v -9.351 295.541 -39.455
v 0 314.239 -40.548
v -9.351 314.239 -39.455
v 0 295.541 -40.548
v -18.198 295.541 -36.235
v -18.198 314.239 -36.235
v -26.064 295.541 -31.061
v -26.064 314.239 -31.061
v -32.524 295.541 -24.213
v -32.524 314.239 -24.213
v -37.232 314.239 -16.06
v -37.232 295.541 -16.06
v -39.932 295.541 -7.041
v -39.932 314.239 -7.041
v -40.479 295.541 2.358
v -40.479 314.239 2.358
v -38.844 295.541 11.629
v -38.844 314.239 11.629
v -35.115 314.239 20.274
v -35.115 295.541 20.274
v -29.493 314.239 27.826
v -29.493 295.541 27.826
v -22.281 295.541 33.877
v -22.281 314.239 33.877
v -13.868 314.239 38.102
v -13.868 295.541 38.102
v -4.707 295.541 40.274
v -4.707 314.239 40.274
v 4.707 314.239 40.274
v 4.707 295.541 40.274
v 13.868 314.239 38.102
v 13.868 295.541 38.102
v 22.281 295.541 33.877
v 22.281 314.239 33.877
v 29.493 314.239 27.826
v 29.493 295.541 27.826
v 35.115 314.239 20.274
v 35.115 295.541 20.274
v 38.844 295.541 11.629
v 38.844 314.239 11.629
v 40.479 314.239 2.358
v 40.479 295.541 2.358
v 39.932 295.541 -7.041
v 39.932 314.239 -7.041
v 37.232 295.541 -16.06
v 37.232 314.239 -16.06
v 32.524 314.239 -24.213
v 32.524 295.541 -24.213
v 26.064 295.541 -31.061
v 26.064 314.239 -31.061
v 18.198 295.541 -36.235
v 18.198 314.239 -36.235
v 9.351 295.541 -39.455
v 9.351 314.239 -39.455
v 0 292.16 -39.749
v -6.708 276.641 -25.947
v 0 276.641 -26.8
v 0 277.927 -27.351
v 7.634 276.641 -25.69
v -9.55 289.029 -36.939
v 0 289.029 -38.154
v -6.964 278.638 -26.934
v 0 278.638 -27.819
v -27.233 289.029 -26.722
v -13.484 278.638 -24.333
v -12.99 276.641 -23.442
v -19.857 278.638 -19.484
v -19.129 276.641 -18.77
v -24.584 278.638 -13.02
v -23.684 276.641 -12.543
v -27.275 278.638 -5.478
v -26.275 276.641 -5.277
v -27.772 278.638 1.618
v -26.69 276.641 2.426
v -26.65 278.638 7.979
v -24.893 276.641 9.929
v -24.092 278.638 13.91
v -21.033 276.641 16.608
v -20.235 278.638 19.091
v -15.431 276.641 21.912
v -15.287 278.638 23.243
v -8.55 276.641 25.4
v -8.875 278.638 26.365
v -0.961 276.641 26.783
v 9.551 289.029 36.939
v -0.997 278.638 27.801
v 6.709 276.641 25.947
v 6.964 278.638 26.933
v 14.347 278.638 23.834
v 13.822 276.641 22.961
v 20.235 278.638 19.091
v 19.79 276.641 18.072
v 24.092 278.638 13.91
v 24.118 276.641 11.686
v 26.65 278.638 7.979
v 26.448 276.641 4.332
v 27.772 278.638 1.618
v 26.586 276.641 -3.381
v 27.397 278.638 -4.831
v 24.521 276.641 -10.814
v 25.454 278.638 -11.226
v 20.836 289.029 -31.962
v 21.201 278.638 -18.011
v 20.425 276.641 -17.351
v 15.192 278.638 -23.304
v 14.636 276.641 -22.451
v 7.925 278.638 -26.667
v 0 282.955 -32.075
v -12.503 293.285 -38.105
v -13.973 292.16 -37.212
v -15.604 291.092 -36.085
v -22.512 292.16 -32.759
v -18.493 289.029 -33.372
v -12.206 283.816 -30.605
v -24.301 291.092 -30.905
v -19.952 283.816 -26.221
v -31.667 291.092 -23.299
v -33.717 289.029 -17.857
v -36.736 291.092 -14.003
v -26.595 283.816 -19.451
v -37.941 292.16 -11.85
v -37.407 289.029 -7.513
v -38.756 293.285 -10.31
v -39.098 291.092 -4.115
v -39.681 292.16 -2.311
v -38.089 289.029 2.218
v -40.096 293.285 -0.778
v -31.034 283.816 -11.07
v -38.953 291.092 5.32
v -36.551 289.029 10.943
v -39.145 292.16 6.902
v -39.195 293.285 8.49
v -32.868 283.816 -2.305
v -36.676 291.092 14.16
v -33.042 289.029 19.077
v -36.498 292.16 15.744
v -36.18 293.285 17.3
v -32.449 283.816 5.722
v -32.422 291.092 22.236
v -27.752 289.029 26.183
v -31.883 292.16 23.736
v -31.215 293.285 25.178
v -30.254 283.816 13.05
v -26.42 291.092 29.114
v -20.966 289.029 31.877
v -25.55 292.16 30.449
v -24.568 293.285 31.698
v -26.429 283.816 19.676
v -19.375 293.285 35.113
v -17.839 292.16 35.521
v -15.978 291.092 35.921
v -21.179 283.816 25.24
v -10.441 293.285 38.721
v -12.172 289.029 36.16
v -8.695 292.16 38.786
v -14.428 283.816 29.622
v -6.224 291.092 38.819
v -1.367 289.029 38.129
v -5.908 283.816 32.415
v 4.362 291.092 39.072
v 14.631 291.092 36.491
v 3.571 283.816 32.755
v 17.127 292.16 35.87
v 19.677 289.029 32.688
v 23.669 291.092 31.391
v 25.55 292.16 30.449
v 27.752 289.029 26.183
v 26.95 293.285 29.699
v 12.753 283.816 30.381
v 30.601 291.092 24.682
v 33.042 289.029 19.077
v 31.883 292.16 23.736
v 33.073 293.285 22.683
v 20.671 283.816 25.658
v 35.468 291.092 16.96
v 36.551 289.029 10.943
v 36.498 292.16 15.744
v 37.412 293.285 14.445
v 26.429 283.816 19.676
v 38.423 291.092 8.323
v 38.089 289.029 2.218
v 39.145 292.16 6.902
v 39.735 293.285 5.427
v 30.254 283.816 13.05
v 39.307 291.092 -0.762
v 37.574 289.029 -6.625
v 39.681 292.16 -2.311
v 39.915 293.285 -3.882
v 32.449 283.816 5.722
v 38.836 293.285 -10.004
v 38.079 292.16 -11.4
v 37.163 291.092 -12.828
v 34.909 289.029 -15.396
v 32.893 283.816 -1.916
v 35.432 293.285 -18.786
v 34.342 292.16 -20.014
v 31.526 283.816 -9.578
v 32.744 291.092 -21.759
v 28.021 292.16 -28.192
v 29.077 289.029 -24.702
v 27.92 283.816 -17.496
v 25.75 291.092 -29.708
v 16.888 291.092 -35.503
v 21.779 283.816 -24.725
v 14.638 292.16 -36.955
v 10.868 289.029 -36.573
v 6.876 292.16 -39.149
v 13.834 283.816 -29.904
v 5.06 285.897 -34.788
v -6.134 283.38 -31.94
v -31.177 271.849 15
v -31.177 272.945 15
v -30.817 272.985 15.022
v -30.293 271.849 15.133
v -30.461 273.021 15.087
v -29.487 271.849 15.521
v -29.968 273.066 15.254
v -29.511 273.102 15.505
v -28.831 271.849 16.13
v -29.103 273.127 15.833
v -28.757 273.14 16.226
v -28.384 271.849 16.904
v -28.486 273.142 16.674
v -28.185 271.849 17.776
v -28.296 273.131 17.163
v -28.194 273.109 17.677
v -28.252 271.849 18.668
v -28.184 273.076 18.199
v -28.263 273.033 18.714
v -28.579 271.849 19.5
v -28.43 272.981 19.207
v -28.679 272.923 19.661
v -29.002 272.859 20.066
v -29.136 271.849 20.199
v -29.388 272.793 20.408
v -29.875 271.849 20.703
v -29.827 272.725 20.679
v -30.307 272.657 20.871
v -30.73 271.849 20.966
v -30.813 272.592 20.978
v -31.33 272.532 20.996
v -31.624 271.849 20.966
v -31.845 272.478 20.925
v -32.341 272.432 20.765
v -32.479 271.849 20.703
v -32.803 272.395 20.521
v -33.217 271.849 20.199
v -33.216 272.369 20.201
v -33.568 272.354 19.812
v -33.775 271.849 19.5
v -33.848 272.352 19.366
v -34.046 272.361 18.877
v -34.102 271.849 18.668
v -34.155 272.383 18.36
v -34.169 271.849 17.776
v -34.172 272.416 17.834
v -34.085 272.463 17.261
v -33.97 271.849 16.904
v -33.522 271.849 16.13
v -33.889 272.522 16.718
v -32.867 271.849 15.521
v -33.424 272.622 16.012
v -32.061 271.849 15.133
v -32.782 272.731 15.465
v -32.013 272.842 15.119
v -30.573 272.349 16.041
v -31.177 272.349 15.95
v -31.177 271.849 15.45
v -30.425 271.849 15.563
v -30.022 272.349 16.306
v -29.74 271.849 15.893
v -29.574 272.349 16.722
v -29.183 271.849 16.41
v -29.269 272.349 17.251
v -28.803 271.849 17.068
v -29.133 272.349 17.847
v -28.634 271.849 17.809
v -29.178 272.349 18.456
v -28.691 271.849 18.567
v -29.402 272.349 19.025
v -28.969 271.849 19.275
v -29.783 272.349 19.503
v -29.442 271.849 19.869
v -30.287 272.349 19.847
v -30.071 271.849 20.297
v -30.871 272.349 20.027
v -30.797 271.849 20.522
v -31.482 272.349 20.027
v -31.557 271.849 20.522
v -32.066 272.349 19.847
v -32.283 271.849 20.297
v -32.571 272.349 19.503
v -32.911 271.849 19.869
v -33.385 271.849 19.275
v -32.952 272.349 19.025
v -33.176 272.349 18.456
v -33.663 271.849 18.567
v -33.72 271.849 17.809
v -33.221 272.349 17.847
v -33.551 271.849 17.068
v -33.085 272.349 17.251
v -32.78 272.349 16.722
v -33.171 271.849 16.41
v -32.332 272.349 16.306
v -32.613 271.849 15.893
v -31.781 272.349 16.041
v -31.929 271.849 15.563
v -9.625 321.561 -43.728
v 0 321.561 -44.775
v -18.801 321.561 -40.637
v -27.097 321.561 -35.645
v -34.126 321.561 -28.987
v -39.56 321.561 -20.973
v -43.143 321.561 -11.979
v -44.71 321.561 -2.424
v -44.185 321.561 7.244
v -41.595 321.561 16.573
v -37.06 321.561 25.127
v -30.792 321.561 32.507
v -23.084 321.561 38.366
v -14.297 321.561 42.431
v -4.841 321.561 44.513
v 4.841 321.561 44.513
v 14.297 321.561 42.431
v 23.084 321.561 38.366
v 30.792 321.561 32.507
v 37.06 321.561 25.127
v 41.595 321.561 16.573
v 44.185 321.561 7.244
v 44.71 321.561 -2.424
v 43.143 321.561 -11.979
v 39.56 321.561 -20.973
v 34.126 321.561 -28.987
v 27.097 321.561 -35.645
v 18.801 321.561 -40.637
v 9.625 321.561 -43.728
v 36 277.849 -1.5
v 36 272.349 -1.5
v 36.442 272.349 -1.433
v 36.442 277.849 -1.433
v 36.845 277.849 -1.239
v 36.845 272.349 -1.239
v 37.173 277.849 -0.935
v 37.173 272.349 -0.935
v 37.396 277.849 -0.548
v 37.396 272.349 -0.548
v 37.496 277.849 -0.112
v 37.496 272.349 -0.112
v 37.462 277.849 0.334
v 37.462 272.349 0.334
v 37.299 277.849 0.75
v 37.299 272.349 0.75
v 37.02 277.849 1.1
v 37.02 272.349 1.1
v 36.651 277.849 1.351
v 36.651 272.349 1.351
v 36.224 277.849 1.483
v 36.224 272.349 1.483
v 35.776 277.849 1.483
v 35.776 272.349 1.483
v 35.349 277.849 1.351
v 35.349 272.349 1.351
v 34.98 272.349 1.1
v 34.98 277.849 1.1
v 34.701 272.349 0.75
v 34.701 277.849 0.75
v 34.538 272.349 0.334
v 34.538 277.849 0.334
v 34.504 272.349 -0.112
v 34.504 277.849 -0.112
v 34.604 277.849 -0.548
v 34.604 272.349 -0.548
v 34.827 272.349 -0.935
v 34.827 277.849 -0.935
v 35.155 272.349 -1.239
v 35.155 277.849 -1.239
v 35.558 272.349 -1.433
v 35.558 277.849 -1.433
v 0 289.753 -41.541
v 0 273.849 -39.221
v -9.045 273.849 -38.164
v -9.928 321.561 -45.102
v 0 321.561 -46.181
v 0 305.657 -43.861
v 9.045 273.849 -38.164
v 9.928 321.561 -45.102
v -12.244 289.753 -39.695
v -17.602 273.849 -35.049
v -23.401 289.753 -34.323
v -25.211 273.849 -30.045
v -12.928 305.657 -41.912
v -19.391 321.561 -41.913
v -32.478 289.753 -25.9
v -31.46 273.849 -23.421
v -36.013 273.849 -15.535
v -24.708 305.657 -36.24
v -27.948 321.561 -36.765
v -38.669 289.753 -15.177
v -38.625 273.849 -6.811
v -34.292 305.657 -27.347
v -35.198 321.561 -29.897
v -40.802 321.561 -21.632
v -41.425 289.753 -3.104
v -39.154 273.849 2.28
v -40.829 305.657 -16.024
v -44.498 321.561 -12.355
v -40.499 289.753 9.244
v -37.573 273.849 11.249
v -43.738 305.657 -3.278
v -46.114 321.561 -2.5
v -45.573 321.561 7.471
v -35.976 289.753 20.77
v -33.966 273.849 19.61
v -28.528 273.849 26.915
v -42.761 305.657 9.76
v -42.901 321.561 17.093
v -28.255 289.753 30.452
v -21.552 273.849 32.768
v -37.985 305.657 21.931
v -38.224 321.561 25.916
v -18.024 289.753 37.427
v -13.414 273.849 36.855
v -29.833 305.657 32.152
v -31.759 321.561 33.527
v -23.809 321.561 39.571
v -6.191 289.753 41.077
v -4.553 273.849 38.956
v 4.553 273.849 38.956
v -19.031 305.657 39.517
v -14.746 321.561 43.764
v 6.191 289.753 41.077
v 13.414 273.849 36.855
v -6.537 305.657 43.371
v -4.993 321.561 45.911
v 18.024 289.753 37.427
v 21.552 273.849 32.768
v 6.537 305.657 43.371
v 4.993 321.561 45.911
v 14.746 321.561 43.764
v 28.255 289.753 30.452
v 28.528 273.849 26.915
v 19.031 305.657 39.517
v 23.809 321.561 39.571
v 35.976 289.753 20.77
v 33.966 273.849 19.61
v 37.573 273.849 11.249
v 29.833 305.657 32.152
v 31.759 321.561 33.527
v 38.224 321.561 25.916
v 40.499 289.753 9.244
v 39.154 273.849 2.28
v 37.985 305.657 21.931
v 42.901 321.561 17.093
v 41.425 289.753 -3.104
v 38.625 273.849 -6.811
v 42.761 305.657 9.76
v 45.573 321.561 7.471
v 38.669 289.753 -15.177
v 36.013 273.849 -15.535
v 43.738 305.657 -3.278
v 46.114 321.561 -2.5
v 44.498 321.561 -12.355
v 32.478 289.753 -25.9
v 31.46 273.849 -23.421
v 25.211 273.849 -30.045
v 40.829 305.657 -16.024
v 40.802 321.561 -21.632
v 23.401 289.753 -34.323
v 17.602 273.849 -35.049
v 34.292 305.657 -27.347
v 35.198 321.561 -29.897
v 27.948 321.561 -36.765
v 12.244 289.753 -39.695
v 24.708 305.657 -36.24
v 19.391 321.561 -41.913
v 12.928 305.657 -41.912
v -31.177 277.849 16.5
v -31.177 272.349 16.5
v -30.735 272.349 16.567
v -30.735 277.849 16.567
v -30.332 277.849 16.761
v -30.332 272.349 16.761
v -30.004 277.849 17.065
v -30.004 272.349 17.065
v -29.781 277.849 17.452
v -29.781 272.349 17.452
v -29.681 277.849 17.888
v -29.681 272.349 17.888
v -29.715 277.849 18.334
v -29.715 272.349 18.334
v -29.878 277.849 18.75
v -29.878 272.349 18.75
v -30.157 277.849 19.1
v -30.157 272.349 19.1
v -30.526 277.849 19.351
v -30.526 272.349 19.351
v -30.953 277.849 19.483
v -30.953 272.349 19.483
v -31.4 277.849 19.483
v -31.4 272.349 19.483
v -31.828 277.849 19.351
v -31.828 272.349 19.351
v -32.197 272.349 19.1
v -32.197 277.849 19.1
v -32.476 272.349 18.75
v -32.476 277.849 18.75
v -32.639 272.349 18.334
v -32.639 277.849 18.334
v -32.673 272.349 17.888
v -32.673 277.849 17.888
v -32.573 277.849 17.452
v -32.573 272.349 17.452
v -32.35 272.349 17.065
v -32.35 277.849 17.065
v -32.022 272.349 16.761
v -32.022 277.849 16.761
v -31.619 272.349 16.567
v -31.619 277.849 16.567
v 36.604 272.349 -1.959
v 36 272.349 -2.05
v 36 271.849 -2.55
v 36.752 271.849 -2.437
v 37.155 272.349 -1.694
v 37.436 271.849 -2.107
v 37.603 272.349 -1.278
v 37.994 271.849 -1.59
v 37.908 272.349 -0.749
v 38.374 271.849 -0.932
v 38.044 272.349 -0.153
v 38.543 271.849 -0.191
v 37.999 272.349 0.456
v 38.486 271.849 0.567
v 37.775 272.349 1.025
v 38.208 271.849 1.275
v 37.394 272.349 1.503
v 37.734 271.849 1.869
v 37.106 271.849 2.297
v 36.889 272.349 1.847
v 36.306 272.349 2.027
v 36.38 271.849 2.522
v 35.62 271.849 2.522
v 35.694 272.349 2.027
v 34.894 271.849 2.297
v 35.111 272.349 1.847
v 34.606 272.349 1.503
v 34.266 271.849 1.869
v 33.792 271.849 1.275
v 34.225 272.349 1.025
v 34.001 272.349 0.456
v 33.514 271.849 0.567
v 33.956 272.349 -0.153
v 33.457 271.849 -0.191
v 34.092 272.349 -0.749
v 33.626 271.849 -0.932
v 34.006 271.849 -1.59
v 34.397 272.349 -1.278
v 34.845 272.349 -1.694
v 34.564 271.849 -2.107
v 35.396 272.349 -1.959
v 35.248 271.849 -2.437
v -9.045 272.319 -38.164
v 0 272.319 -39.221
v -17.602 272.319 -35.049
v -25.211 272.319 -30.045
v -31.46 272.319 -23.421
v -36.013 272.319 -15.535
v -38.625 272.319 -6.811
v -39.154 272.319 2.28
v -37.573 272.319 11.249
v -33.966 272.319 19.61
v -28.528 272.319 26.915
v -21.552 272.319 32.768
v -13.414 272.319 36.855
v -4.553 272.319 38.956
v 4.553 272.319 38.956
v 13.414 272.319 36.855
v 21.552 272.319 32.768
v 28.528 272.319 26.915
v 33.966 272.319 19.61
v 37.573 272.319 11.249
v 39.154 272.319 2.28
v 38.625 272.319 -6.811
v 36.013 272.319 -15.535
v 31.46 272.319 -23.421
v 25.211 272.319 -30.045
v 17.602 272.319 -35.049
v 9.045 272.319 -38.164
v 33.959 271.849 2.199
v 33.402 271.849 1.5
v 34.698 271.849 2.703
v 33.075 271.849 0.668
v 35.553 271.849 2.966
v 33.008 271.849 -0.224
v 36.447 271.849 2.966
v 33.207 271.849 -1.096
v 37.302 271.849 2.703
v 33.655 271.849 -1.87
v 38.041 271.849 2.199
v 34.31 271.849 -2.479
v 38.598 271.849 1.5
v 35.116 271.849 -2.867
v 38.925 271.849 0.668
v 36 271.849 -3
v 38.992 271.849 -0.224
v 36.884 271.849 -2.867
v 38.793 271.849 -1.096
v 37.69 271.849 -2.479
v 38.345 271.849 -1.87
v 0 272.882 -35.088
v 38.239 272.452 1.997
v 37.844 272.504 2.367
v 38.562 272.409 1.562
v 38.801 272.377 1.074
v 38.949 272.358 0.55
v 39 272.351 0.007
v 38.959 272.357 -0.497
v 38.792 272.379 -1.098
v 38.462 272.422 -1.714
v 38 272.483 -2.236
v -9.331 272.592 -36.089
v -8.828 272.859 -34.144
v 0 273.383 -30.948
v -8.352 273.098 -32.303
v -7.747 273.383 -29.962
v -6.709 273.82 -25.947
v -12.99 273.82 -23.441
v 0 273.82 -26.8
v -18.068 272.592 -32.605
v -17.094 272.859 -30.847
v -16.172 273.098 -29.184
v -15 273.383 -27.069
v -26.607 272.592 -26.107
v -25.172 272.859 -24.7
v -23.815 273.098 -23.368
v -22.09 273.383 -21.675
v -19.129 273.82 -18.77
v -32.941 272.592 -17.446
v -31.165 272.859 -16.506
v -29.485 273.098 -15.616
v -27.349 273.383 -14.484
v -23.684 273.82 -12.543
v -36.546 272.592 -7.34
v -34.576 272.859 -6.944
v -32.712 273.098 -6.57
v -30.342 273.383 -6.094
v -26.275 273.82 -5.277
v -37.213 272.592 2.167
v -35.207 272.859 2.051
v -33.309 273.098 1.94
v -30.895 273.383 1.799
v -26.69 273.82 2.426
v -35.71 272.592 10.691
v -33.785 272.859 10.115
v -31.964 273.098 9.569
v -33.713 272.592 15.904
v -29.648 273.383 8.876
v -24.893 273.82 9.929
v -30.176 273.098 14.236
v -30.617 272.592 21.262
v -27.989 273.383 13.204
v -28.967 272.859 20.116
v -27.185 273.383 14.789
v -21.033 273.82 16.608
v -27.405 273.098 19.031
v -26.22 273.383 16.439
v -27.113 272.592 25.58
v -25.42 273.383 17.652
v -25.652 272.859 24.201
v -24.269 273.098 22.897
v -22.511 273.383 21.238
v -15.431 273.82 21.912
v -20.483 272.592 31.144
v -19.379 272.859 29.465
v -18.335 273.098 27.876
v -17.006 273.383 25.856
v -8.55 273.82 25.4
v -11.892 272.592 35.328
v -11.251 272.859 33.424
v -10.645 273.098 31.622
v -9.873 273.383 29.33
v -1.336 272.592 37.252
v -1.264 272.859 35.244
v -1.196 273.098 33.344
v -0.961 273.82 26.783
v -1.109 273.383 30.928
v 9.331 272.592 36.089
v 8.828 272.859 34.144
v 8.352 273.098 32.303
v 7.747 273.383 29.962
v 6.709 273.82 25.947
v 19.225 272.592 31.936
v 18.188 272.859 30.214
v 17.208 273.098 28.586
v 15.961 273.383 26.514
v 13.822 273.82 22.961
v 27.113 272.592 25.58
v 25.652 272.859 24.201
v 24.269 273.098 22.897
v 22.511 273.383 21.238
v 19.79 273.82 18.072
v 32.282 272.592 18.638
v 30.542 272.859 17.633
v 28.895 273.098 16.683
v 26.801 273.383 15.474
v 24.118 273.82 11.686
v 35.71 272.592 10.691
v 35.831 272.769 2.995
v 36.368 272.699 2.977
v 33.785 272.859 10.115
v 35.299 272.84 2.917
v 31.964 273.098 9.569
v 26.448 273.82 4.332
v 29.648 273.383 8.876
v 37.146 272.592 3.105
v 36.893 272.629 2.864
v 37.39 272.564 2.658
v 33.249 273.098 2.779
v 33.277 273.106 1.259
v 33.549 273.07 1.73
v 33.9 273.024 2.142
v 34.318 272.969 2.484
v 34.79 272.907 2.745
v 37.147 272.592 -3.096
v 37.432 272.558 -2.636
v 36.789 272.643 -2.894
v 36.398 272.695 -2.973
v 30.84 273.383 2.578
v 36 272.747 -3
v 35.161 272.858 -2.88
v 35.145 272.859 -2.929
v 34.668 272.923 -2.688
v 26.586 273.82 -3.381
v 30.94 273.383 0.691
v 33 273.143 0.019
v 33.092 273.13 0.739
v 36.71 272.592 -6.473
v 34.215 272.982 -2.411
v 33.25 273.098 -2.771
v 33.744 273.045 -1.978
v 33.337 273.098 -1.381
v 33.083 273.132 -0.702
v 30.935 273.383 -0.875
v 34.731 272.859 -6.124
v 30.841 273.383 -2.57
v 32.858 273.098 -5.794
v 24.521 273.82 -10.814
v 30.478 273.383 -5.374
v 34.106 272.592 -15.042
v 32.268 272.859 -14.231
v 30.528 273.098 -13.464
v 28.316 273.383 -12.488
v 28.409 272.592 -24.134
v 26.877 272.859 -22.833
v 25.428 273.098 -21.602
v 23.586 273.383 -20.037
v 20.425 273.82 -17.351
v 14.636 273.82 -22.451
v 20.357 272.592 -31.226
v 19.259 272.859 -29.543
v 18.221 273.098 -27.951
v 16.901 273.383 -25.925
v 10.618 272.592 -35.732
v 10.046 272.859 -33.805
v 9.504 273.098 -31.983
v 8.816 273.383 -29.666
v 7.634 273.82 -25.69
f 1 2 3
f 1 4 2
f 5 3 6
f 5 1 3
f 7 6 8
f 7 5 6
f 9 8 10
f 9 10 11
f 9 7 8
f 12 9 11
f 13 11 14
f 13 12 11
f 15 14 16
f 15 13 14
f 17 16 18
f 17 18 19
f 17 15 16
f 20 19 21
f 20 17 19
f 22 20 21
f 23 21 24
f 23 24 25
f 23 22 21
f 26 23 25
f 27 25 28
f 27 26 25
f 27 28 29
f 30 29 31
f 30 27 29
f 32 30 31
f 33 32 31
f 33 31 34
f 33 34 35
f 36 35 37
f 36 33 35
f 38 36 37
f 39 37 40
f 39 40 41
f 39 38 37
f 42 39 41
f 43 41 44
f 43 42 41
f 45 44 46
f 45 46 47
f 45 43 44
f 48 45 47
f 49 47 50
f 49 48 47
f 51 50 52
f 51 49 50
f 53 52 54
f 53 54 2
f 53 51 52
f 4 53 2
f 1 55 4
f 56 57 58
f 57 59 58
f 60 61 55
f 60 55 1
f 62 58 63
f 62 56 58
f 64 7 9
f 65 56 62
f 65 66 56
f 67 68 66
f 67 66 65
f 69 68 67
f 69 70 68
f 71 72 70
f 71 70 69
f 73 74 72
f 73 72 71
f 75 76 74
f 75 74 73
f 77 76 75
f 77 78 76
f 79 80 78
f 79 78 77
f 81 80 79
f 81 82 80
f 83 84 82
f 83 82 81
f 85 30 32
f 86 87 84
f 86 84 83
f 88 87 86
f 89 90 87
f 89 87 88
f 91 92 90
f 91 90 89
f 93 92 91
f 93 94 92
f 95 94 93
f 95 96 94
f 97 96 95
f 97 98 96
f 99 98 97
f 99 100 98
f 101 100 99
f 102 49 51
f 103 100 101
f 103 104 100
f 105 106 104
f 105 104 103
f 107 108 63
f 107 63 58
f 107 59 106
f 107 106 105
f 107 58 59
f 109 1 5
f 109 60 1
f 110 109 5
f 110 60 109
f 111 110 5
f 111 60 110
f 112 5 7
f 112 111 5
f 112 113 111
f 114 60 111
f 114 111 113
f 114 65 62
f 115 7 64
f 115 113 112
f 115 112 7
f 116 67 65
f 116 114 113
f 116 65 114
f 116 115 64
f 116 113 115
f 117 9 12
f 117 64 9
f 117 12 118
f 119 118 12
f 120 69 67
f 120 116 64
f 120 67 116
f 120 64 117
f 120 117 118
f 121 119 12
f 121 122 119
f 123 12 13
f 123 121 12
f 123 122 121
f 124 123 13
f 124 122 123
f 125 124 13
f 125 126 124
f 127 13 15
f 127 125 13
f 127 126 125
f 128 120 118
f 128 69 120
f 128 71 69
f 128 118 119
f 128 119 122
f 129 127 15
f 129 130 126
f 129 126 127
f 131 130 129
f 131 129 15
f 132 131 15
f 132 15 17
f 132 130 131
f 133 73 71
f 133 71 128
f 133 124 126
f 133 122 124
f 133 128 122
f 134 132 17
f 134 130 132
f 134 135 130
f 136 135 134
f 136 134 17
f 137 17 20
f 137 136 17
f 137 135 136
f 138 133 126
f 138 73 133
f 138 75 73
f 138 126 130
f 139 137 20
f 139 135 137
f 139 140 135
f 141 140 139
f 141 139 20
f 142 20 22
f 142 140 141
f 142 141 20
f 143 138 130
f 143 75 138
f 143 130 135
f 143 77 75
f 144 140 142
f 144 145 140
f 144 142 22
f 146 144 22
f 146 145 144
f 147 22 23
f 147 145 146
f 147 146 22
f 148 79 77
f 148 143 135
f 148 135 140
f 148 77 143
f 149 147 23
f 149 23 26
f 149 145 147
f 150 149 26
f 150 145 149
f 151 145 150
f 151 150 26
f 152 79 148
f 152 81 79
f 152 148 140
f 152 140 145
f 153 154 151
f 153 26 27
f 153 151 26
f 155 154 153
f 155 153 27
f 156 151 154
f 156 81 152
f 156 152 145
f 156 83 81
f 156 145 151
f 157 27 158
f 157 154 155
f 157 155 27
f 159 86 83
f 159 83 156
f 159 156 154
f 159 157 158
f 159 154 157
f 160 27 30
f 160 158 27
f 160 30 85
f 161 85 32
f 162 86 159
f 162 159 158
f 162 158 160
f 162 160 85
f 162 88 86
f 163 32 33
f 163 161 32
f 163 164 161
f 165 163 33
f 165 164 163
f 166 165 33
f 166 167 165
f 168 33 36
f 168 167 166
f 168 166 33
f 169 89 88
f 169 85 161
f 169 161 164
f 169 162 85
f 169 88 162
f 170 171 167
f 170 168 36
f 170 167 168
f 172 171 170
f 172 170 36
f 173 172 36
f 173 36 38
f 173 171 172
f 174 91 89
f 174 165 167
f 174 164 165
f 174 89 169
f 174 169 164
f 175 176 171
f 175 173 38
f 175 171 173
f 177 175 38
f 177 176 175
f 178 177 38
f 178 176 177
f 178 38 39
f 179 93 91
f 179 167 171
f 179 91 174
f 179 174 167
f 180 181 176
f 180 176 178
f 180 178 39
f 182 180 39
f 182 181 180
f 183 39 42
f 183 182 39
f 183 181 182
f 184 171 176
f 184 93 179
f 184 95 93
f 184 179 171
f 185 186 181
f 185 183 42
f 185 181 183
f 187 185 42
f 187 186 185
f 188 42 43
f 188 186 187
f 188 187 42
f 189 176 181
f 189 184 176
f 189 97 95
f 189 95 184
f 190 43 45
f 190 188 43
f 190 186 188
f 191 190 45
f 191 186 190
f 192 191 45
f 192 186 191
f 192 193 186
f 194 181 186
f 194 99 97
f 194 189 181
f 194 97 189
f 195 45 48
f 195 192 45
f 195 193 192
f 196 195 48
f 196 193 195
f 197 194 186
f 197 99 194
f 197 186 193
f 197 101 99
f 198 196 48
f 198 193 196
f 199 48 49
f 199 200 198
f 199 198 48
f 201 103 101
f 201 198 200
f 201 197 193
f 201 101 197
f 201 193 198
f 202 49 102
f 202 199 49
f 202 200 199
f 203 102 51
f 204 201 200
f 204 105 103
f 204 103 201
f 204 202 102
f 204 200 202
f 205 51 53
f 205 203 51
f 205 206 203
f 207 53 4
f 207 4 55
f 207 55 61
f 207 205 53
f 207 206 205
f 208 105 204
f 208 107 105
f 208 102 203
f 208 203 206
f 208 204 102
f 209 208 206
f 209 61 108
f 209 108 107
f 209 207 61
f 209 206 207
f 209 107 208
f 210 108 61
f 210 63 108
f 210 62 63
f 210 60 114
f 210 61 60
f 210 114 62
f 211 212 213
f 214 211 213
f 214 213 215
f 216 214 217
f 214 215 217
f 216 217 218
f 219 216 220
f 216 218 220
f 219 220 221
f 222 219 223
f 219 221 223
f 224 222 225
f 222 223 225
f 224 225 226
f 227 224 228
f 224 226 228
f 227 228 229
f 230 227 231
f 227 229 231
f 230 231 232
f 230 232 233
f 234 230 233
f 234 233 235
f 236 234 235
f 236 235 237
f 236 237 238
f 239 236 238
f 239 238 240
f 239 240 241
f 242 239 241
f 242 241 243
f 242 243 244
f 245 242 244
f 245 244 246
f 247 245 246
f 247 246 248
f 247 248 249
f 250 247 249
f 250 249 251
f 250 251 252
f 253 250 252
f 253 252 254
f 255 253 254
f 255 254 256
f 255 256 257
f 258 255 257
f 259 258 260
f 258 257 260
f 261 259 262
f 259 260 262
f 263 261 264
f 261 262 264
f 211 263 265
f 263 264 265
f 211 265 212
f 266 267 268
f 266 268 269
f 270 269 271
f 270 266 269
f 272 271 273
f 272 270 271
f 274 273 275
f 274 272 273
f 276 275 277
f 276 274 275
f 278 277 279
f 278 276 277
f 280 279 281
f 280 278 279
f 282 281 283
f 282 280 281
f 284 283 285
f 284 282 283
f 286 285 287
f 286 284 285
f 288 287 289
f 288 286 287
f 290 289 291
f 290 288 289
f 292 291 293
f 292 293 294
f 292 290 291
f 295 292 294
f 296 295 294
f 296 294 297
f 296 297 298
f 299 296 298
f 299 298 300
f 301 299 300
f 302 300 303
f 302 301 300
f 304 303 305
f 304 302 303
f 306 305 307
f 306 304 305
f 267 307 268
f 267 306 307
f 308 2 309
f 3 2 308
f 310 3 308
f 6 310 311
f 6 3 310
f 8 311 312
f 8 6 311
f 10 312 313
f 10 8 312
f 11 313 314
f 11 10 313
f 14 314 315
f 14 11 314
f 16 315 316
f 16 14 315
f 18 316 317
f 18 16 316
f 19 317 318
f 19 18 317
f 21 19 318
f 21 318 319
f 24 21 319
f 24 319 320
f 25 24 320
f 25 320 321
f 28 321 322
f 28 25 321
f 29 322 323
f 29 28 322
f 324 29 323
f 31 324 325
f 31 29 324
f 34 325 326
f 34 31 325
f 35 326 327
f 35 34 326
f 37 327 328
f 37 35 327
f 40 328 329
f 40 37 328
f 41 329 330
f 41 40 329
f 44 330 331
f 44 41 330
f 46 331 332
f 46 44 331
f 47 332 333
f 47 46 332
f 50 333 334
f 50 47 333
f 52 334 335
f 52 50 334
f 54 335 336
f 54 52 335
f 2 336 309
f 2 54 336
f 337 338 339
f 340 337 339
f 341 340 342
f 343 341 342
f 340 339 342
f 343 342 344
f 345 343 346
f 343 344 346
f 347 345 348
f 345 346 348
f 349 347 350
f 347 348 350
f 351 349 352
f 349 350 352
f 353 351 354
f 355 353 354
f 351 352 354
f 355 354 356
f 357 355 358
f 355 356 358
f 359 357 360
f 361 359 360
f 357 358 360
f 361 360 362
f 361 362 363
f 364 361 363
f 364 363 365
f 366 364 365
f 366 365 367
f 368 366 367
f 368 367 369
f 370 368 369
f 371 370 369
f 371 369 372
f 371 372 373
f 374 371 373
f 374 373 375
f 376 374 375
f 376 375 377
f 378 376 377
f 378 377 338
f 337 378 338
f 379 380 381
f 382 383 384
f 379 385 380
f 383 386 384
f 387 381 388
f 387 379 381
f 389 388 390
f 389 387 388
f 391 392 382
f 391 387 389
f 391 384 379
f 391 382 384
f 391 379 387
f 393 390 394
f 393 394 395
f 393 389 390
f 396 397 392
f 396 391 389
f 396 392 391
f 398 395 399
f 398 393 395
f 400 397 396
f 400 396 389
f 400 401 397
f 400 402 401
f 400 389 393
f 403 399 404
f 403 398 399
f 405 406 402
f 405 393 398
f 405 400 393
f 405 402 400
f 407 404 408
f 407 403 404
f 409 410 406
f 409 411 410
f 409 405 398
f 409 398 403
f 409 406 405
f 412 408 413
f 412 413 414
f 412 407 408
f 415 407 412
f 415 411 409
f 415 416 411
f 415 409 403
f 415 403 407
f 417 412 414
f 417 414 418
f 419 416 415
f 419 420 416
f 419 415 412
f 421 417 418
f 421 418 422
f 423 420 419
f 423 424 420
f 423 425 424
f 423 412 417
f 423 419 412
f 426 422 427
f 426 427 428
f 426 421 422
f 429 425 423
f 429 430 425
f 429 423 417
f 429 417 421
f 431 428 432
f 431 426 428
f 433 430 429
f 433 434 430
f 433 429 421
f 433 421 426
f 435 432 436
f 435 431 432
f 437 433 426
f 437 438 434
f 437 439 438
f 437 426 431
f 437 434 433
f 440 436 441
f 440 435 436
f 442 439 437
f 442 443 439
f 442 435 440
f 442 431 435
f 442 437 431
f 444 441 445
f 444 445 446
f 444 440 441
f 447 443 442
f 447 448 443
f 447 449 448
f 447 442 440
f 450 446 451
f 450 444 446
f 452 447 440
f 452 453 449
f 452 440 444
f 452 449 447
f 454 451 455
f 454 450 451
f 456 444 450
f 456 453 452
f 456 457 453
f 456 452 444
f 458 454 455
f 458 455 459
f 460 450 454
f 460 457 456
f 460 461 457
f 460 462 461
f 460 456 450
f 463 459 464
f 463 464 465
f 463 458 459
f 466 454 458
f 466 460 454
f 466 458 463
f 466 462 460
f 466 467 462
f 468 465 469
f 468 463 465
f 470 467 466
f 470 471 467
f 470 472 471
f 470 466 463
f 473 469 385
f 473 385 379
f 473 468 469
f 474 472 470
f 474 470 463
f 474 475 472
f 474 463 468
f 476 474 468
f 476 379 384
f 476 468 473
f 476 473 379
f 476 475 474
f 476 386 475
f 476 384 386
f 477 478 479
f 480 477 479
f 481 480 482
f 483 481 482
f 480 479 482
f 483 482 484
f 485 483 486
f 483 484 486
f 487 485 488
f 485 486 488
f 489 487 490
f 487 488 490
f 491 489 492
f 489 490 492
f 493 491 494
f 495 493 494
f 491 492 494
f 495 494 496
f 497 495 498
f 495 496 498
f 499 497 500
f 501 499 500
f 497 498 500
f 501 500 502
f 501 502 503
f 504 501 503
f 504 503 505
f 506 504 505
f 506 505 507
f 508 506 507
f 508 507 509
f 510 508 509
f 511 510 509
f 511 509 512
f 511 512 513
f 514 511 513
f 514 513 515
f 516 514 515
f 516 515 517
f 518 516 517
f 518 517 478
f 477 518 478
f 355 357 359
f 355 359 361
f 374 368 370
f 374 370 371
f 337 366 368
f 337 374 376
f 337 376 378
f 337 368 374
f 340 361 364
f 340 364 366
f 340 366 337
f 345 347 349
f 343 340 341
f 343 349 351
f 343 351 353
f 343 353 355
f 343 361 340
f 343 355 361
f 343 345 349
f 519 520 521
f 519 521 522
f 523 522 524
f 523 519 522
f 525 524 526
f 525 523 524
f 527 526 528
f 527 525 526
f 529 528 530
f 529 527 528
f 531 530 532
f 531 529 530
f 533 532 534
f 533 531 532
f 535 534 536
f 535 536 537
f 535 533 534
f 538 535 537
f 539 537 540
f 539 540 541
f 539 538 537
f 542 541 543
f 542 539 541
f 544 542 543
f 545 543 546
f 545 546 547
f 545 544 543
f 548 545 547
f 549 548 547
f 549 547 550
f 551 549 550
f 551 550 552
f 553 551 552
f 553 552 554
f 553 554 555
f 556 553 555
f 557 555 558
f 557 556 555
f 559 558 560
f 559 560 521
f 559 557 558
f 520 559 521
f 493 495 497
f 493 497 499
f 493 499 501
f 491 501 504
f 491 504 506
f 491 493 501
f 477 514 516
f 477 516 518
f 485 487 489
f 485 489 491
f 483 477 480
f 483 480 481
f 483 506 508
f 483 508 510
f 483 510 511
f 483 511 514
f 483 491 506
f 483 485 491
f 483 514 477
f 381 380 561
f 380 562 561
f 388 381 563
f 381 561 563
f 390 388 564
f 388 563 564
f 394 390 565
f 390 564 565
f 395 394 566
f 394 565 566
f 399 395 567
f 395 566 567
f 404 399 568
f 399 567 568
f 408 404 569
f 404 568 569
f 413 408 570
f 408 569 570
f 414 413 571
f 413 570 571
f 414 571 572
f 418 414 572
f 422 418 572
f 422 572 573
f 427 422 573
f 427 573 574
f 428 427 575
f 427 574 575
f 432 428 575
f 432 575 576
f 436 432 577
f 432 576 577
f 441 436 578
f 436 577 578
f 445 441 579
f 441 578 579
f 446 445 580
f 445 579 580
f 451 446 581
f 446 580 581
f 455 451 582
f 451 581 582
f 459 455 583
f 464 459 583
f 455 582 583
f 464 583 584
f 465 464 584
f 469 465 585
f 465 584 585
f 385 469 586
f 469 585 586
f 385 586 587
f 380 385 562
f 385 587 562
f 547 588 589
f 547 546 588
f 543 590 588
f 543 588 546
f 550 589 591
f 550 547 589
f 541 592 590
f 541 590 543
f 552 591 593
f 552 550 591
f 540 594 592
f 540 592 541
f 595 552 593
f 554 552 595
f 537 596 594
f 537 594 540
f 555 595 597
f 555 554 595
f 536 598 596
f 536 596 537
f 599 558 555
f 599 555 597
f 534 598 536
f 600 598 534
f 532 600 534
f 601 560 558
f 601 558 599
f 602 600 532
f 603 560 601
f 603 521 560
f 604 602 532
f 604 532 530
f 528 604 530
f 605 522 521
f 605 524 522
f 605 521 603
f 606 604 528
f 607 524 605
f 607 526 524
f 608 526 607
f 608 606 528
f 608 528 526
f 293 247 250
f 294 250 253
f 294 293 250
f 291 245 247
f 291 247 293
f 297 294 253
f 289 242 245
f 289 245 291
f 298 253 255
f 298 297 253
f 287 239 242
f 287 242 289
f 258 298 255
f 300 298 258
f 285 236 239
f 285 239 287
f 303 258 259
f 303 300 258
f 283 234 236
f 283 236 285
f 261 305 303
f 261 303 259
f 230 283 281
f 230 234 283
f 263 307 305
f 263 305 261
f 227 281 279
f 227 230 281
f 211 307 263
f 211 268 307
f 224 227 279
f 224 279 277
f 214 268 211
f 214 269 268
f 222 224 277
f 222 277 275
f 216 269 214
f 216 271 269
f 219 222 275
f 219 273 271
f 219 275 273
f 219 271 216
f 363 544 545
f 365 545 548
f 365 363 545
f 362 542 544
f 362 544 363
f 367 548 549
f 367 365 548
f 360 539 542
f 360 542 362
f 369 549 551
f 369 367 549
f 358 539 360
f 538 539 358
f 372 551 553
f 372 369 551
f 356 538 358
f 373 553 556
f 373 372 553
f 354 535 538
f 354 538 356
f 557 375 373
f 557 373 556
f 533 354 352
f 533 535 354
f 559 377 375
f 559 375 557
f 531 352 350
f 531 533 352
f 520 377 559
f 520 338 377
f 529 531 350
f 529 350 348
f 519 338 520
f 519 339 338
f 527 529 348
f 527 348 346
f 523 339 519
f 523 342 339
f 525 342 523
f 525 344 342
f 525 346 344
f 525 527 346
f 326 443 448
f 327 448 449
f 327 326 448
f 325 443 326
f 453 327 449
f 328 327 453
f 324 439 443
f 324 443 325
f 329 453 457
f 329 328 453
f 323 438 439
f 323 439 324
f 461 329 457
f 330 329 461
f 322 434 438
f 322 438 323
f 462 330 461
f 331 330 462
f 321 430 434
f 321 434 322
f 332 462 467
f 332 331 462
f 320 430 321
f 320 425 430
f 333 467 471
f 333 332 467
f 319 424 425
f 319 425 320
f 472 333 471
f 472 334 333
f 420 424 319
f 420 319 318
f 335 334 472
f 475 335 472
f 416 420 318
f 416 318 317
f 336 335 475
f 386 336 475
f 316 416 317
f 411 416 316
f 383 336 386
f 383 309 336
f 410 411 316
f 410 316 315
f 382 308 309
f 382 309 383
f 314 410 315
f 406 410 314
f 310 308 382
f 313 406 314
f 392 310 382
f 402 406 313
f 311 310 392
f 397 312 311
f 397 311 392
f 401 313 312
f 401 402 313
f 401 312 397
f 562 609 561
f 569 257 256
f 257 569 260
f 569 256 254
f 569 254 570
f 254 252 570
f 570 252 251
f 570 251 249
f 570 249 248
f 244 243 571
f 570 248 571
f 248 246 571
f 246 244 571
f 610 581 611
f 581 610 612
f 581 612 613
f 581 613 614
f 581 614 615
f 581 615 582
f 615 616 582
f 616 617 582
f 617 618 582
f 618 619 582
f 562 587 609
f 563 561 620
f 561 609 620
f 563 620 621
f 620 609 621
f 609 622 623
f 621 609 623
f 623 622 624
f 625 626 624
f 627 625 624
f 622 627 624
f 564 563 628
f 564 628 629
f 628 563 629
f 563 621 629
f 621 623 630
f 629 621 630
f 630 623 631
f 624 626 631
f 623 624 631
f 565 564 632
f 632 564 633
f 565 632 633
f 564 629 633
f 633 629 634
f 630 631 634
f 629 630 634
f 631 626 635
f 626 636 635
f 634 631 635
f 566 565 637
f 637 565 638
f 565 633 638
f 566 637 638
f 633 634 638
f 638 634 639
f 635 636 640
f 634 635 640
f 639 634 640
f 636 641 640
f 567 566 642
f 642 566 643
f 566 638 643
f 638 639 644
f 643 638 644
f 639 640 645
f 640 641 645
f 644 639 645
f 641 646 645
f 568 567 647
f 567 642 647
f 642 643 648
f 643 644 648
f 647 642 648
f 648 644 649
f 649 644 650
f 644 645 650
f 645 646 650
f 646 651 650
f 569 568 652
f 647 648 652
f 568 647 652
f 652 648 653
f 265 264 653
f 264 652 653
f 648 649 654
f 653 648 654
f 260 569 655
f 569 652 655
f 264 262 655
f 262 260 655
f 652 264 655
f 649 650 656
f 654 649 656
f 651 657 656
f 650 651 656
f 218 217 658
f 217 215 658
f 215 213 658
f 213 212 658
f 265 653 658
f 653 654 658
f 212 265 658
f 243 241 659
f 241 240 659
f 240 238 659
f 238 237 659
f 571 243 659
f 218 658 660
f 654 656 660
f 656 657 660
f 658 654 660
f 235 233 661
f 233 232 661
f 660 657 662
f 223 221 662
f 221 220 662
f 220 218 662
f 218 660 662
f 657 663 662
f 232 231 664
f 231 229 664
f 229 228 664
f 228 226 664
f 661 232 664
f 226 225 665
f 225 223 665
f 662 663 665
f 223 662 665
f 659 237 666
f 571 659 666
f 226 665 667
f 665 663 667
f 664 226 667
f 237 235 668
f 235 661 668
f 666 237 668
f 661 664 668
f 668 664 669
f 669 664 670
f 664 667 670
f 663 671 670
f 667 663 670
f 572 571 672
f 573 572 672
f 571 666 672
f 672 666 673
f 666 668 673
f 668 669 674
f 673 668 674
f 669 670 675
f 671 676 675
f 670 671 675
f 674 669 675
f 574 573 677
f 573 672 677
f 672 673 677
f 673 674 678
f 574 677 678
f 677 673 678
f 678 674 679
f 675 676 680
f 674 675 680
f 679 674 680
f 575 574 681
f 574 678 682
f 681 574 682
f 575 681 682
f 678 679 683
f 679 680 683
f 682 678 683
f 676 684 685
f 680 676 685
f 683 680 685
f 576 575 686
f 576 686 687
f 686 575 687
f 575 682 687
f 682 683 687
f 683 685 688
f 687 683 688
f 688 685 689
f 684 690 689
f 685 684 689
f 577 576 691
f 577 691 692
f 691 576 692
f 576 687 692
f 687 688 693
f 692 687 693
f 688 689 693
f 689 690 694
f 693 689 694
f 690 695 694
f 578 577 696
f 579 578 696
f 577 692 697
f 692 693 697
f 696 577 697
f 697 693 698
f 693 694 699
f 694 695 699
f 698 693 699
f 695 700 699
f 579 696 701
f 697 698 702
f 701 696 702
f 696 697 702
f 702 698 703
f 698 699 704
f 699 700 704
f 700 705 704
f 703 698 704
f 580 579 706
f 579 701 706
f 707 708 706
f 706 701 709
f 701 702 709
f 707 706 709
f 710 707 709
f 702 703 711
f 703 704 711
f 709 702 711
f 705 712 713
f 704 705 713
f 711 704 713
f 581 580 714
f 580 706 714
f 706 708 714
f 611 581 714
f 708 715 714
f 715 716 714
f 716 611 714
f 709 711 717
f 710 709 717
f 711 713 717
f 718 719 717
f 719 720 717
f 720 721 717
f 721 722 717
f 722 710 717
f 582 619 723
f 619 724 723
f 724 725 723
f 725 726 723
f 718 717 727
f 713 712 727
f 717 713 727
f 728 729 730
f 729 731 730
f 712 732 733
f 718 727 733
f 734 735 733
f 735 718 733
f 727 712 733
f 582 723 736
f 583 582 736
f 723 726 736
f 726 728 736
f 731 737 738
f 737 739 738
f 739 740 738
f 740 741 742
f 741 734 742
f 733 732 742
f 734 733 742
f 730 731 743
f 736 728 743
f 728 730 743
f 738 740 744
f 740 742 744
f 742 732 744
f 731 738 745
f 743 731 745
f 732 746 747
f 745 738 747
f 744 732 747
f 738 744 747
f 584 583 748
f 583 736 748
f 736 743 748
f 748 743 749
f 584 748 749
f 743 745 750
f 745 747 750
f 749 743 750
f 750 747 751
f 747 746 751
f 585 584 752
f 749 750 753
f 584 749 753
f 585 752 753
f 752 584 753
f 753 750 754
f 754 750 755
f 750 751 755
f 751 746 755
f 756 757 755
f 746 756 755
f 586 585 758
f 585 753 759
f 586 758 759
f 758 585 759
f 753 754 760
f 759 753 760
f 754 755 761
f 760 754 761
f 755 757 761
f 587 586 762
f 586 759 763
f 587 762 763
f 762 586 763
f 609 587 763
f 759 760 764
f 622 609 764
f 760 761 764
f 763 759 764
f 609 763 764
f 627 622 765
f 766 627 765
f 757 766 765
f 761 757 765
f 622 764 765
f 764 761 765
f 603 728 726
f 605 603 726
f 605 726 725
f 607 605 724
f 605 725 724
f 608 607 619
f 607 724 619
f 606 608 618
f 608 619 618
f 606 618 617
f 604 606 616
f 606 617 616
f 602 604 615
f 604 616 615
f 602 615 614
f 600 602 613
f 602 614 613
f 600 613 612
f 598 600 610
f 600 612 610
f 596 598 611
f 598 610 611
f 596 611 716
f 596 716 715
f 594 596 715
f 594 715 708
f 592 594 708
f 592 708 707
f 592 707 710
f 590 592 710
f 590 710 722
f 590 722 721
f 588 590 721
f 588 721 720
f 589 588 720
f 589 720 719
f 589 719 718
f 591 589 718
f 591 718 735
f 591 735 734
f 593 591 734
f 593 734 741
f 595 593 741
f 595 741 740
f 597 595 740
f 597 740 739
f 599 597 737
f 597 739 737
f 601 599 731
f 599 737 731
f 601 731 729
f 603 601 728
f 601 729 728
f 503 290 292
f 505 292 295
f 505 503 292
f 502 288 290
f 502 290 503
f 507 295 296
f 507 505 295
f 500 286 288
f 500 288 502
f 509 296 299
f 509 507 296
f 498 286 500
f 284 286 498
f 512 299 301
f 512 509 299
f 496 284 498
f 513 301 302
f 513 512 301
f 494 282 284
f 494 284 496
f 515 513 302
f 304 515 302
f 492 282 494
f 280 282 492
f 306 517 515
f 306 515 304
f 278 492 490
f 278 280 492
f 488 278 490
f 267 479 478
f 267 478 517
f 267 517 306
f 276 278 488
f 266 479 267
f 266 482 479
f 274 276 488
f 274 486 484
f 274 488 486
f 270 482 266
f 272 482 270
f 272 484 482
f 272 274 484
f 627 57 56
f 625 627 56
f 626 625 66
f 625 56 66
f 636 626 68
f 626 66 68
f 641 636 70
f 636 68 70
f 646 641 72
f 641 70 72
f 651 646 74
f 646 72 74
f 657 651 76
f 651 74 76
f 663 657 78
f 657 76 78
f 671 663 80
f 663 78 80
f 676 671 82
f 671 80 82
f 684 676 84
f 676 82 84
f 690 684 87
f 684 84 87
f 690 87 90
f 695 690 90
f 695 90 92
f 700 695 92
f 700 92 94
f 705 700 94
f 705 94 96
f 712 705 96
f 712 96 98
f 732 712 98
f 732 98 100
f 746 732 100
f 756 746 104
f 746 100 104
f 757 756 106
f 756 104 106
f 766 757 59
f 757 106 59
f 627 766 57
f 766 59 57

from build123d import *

# Parameters (mm, degrees)
SKETCH4_R           = 3
BOSS_EXTRUDE1_DEPTH = 2
SKETCH9_R           = 1.5
CUT_EXTRUDE1_DEPTH  = 6
SKETCH10_R          = 2
CUT_EXTRUDE2_DEPTH  = 0.5
CHAMFER3_SIZE       = 0.55
SKETCH11_R          = 26.8
CUT_EXTRUDE3_DEPTH  = 83.07769274


with BuildPart() as part:
    # Sketch2 → Revolve6 (revolve)
    with BuildSketch(Plane(origin=(0, 0, 0), x_dir=(0, 0, -1), z_dir=(1, 0, 0))):
        with BuildLine():
            Line((26.5077562, 274.996982717), (26.5077562, 273.848618937))
            Line((26.5077562, 273.848618937), (39.220771912, 273.848618937))
            Line((39.220771912, 273.848618937), (46.181267187, 321.561079724))
            Line((46.181267187, 321.561079724), (44.775299462, 321.561079724))
            Line((44.775299462, 321.561079724), (40.547674755, 314.238618937))
            Line((40.547674755, 314.238618937), (40.547674755, 295.540718438))
            add(Edge.make_bspline(
                [(40.547674755, 295.540718438), (40.447740466, 295.012709616), (40.292777353, 293.970757619), (39.930889755, 292.587532753), (39.516186416, 291.581451359), (39.108370782, 290.57804728), (38.439698054, 289.316986818), (37.331416086, 288.032583079), (36.368363881, 287.115418474), (35.630231264, 286.340079673), (35.016472726, 285.762737126), (34.394259795, 285.247169223), (33.635524662, 284.556557999), (32.920361334, 283.771384038), (32.129651901, 282.986073936), (31.485241784, 282.459482323), (30.914997208, 281.963476573), (30.371700346, 281.391298159), (29.782796159, 280.80462685), (29.227584581, 280.262154528), (28.724752618, 279.674853681), (28.180386253, 279.039651715), (27.651838315, 278.470209992), (27.308145935, 277.876839187), (26.995230081, 277.127164256), (26.597952618, 276.164510632), (26.464811583, 275.470548141), (26.5077562, 274.996982717)],
                knots=[0, 0, 0, 0, 0.062544048, 0.125088096, 0.156360121, 0.187632145, 0.250176193, 0.312720241, 0.375264289, 0.406536313, 0.437808337, 0.469080362, 0.500352386, 0.562896434, 0.594168458, 0.625440482, 0.656712506, 0.68798453, 0.719256554, 0.750528579, 0.781800603, 0.813072627, 0.844344651, 0.875616675, 0.906888699, 0.938160723, 1.000704771, 1.000704771, 1.000704771, 1.000704771], degree=3))
        make_face()
    revolve(axis=Axis((0, 5, 0), (0, 1, 0)))

    # Sketch4 → Boss-Extrude1 (add)
    with BuildSketch(Plane.XZ.offset(-273.848618937)):
        with Locations(Location((-31.176914536, 18, 0), (0, 0, 270))):
            Circle(SKETCH4_R)
        with Locations(Location((36, 0, 0), (0, 0, 270))):
            Circle(SKETCH4_R)
    extrude(amount=BOSS_EXTRUDE1_DEPTH)

    # Sketch7 → Revolve7 (revolve)
    with BuildSketch(Plane(origin=(0, 0, 0), x_dir=(0, 0, -1), z_dir=(1, 0, 0))):
        with BuildLine():
            Line((39.220771912, 273.848618937), (39.220771912, 272.319355593))
            ThreePointArc((39.220771912, 272.319355593), (32.873157949, 273.157923648), (26.5077562, 273.848618937))
            Line((26.5077562, 273.848618937), (26.5077562, 274.348618937))
            Line((26.5077562, 274.348618937), (39.220771912, 274.348618937))
            Line((39.220771912, 274.348618937), (39.220771912, 273.848618937))
        make_face()
    revolve(axis=Axis((0, 5, 0), (0, 1, 0)))

    # Sketch9 → Cut-Extrude1 (cut)
    with BuildSketch(Plane.XZ.offset(-271.848618937)):
        with Locations(Location((36, 0, 0), (0, 0, 270))):
            Circle(SKETCH9_R)
        with Locations(Location((-31.176914536, 18, 0), (0, 0, 270))):
            Circle(SKETCH9_R)
    extrude(amount=-CUT_EXTRUDE1_DEPTH, mode=Mode.SUBTRACT)

    # Sketch10 → Cut-Extrude2 (cut)
    with BuildSketch(Plane.XZ.offset(-271.848618937)):
        with Locations(Location((36, 0, 0), (0, 0, 270))):
            Circle(SKETCH10_R)
        with Locations(Location((-31.176914536, 18, 0), (0, 0, 270))):
            Circle(SKETCH10_R)
    extrude(amount=-CUT_EXTRUDE2_DEPTH, mode=Mode.SUBTRACT)

    # Chamfer3
    # the kernel refuses this chamfer: 0.55 mm, written as the material it takes off along each edge
    with BuildSketch(Plane(origin=(36, 271.848618937, 0), x_dir=(0, 0, -1), z_dir=(-1, 0, 0))) as chamfer3_piece_1_section:
        Polygon((2 + CHAMFER3_SIZE, 0), (2, -CHAMFER3_SIZE), (2, 0), align=None)
    chamfer3_piece_1 = revolve(axis=Axis((36, 271.848618937, 0), (0, -1, 0)), mode=Mode.PRIVATE)
    chamfer3_piece_1 = split(chamfer3_piece_1, bisect_by=Plane(origin=(36, 272.348618937, 2.298516155), z_dir=(0, -1, 0)), keep=Keep.TOP, mode=Mode.PRIVATE)
    add(chamfer3_piece_1, mode=Mode.SUBTRACT)
    with BuildSketch(Plane(origin=(-31.176914536, 271.848618937, 18), x_dir=(0, 0, -1), z_dir=(-1, 0, 0))) as chamfer3_piece_2_section:
        Polygon((2 + CHAMFER3_SIZE, 0), (2, -CHAMFER3_SIZE), (2, 0), align=None)
    chamfer3_piece_2 = revolve(axis=Axis((-31.176914536, 271.848618937, 18), (0, -1, 0)), mode=Mode.PRIVATE)
    chamfer3_piece_2 = split(chamfer3_piece_2, bisect_by=Plane(origin=(-31.176914536, 272.348618937, 20.298516155), z_dir=(0, -1, 0)), keep=Keep.TOP, mode=Mode.PRIVATE)
    add(chamfer3_piece_2, mode=Mode.SUBTRACT)

    # Sketch11 → Cut-Extrude3 (cut, through all)
    with BuildSketch(Plane(origin=(0, 321.561079724, 0), x_dir=(1, 0, 0), z_dir=(0, 1, 0))):
        with Locations(Location((0, 0, 0), (0, 0, 90))):
            Circle(SKETCH11_R)
    extrude(amount=-CUT_EXTRUDE3_DEPTH, mode=Mode.SUBTRACT)


solid = part.part
